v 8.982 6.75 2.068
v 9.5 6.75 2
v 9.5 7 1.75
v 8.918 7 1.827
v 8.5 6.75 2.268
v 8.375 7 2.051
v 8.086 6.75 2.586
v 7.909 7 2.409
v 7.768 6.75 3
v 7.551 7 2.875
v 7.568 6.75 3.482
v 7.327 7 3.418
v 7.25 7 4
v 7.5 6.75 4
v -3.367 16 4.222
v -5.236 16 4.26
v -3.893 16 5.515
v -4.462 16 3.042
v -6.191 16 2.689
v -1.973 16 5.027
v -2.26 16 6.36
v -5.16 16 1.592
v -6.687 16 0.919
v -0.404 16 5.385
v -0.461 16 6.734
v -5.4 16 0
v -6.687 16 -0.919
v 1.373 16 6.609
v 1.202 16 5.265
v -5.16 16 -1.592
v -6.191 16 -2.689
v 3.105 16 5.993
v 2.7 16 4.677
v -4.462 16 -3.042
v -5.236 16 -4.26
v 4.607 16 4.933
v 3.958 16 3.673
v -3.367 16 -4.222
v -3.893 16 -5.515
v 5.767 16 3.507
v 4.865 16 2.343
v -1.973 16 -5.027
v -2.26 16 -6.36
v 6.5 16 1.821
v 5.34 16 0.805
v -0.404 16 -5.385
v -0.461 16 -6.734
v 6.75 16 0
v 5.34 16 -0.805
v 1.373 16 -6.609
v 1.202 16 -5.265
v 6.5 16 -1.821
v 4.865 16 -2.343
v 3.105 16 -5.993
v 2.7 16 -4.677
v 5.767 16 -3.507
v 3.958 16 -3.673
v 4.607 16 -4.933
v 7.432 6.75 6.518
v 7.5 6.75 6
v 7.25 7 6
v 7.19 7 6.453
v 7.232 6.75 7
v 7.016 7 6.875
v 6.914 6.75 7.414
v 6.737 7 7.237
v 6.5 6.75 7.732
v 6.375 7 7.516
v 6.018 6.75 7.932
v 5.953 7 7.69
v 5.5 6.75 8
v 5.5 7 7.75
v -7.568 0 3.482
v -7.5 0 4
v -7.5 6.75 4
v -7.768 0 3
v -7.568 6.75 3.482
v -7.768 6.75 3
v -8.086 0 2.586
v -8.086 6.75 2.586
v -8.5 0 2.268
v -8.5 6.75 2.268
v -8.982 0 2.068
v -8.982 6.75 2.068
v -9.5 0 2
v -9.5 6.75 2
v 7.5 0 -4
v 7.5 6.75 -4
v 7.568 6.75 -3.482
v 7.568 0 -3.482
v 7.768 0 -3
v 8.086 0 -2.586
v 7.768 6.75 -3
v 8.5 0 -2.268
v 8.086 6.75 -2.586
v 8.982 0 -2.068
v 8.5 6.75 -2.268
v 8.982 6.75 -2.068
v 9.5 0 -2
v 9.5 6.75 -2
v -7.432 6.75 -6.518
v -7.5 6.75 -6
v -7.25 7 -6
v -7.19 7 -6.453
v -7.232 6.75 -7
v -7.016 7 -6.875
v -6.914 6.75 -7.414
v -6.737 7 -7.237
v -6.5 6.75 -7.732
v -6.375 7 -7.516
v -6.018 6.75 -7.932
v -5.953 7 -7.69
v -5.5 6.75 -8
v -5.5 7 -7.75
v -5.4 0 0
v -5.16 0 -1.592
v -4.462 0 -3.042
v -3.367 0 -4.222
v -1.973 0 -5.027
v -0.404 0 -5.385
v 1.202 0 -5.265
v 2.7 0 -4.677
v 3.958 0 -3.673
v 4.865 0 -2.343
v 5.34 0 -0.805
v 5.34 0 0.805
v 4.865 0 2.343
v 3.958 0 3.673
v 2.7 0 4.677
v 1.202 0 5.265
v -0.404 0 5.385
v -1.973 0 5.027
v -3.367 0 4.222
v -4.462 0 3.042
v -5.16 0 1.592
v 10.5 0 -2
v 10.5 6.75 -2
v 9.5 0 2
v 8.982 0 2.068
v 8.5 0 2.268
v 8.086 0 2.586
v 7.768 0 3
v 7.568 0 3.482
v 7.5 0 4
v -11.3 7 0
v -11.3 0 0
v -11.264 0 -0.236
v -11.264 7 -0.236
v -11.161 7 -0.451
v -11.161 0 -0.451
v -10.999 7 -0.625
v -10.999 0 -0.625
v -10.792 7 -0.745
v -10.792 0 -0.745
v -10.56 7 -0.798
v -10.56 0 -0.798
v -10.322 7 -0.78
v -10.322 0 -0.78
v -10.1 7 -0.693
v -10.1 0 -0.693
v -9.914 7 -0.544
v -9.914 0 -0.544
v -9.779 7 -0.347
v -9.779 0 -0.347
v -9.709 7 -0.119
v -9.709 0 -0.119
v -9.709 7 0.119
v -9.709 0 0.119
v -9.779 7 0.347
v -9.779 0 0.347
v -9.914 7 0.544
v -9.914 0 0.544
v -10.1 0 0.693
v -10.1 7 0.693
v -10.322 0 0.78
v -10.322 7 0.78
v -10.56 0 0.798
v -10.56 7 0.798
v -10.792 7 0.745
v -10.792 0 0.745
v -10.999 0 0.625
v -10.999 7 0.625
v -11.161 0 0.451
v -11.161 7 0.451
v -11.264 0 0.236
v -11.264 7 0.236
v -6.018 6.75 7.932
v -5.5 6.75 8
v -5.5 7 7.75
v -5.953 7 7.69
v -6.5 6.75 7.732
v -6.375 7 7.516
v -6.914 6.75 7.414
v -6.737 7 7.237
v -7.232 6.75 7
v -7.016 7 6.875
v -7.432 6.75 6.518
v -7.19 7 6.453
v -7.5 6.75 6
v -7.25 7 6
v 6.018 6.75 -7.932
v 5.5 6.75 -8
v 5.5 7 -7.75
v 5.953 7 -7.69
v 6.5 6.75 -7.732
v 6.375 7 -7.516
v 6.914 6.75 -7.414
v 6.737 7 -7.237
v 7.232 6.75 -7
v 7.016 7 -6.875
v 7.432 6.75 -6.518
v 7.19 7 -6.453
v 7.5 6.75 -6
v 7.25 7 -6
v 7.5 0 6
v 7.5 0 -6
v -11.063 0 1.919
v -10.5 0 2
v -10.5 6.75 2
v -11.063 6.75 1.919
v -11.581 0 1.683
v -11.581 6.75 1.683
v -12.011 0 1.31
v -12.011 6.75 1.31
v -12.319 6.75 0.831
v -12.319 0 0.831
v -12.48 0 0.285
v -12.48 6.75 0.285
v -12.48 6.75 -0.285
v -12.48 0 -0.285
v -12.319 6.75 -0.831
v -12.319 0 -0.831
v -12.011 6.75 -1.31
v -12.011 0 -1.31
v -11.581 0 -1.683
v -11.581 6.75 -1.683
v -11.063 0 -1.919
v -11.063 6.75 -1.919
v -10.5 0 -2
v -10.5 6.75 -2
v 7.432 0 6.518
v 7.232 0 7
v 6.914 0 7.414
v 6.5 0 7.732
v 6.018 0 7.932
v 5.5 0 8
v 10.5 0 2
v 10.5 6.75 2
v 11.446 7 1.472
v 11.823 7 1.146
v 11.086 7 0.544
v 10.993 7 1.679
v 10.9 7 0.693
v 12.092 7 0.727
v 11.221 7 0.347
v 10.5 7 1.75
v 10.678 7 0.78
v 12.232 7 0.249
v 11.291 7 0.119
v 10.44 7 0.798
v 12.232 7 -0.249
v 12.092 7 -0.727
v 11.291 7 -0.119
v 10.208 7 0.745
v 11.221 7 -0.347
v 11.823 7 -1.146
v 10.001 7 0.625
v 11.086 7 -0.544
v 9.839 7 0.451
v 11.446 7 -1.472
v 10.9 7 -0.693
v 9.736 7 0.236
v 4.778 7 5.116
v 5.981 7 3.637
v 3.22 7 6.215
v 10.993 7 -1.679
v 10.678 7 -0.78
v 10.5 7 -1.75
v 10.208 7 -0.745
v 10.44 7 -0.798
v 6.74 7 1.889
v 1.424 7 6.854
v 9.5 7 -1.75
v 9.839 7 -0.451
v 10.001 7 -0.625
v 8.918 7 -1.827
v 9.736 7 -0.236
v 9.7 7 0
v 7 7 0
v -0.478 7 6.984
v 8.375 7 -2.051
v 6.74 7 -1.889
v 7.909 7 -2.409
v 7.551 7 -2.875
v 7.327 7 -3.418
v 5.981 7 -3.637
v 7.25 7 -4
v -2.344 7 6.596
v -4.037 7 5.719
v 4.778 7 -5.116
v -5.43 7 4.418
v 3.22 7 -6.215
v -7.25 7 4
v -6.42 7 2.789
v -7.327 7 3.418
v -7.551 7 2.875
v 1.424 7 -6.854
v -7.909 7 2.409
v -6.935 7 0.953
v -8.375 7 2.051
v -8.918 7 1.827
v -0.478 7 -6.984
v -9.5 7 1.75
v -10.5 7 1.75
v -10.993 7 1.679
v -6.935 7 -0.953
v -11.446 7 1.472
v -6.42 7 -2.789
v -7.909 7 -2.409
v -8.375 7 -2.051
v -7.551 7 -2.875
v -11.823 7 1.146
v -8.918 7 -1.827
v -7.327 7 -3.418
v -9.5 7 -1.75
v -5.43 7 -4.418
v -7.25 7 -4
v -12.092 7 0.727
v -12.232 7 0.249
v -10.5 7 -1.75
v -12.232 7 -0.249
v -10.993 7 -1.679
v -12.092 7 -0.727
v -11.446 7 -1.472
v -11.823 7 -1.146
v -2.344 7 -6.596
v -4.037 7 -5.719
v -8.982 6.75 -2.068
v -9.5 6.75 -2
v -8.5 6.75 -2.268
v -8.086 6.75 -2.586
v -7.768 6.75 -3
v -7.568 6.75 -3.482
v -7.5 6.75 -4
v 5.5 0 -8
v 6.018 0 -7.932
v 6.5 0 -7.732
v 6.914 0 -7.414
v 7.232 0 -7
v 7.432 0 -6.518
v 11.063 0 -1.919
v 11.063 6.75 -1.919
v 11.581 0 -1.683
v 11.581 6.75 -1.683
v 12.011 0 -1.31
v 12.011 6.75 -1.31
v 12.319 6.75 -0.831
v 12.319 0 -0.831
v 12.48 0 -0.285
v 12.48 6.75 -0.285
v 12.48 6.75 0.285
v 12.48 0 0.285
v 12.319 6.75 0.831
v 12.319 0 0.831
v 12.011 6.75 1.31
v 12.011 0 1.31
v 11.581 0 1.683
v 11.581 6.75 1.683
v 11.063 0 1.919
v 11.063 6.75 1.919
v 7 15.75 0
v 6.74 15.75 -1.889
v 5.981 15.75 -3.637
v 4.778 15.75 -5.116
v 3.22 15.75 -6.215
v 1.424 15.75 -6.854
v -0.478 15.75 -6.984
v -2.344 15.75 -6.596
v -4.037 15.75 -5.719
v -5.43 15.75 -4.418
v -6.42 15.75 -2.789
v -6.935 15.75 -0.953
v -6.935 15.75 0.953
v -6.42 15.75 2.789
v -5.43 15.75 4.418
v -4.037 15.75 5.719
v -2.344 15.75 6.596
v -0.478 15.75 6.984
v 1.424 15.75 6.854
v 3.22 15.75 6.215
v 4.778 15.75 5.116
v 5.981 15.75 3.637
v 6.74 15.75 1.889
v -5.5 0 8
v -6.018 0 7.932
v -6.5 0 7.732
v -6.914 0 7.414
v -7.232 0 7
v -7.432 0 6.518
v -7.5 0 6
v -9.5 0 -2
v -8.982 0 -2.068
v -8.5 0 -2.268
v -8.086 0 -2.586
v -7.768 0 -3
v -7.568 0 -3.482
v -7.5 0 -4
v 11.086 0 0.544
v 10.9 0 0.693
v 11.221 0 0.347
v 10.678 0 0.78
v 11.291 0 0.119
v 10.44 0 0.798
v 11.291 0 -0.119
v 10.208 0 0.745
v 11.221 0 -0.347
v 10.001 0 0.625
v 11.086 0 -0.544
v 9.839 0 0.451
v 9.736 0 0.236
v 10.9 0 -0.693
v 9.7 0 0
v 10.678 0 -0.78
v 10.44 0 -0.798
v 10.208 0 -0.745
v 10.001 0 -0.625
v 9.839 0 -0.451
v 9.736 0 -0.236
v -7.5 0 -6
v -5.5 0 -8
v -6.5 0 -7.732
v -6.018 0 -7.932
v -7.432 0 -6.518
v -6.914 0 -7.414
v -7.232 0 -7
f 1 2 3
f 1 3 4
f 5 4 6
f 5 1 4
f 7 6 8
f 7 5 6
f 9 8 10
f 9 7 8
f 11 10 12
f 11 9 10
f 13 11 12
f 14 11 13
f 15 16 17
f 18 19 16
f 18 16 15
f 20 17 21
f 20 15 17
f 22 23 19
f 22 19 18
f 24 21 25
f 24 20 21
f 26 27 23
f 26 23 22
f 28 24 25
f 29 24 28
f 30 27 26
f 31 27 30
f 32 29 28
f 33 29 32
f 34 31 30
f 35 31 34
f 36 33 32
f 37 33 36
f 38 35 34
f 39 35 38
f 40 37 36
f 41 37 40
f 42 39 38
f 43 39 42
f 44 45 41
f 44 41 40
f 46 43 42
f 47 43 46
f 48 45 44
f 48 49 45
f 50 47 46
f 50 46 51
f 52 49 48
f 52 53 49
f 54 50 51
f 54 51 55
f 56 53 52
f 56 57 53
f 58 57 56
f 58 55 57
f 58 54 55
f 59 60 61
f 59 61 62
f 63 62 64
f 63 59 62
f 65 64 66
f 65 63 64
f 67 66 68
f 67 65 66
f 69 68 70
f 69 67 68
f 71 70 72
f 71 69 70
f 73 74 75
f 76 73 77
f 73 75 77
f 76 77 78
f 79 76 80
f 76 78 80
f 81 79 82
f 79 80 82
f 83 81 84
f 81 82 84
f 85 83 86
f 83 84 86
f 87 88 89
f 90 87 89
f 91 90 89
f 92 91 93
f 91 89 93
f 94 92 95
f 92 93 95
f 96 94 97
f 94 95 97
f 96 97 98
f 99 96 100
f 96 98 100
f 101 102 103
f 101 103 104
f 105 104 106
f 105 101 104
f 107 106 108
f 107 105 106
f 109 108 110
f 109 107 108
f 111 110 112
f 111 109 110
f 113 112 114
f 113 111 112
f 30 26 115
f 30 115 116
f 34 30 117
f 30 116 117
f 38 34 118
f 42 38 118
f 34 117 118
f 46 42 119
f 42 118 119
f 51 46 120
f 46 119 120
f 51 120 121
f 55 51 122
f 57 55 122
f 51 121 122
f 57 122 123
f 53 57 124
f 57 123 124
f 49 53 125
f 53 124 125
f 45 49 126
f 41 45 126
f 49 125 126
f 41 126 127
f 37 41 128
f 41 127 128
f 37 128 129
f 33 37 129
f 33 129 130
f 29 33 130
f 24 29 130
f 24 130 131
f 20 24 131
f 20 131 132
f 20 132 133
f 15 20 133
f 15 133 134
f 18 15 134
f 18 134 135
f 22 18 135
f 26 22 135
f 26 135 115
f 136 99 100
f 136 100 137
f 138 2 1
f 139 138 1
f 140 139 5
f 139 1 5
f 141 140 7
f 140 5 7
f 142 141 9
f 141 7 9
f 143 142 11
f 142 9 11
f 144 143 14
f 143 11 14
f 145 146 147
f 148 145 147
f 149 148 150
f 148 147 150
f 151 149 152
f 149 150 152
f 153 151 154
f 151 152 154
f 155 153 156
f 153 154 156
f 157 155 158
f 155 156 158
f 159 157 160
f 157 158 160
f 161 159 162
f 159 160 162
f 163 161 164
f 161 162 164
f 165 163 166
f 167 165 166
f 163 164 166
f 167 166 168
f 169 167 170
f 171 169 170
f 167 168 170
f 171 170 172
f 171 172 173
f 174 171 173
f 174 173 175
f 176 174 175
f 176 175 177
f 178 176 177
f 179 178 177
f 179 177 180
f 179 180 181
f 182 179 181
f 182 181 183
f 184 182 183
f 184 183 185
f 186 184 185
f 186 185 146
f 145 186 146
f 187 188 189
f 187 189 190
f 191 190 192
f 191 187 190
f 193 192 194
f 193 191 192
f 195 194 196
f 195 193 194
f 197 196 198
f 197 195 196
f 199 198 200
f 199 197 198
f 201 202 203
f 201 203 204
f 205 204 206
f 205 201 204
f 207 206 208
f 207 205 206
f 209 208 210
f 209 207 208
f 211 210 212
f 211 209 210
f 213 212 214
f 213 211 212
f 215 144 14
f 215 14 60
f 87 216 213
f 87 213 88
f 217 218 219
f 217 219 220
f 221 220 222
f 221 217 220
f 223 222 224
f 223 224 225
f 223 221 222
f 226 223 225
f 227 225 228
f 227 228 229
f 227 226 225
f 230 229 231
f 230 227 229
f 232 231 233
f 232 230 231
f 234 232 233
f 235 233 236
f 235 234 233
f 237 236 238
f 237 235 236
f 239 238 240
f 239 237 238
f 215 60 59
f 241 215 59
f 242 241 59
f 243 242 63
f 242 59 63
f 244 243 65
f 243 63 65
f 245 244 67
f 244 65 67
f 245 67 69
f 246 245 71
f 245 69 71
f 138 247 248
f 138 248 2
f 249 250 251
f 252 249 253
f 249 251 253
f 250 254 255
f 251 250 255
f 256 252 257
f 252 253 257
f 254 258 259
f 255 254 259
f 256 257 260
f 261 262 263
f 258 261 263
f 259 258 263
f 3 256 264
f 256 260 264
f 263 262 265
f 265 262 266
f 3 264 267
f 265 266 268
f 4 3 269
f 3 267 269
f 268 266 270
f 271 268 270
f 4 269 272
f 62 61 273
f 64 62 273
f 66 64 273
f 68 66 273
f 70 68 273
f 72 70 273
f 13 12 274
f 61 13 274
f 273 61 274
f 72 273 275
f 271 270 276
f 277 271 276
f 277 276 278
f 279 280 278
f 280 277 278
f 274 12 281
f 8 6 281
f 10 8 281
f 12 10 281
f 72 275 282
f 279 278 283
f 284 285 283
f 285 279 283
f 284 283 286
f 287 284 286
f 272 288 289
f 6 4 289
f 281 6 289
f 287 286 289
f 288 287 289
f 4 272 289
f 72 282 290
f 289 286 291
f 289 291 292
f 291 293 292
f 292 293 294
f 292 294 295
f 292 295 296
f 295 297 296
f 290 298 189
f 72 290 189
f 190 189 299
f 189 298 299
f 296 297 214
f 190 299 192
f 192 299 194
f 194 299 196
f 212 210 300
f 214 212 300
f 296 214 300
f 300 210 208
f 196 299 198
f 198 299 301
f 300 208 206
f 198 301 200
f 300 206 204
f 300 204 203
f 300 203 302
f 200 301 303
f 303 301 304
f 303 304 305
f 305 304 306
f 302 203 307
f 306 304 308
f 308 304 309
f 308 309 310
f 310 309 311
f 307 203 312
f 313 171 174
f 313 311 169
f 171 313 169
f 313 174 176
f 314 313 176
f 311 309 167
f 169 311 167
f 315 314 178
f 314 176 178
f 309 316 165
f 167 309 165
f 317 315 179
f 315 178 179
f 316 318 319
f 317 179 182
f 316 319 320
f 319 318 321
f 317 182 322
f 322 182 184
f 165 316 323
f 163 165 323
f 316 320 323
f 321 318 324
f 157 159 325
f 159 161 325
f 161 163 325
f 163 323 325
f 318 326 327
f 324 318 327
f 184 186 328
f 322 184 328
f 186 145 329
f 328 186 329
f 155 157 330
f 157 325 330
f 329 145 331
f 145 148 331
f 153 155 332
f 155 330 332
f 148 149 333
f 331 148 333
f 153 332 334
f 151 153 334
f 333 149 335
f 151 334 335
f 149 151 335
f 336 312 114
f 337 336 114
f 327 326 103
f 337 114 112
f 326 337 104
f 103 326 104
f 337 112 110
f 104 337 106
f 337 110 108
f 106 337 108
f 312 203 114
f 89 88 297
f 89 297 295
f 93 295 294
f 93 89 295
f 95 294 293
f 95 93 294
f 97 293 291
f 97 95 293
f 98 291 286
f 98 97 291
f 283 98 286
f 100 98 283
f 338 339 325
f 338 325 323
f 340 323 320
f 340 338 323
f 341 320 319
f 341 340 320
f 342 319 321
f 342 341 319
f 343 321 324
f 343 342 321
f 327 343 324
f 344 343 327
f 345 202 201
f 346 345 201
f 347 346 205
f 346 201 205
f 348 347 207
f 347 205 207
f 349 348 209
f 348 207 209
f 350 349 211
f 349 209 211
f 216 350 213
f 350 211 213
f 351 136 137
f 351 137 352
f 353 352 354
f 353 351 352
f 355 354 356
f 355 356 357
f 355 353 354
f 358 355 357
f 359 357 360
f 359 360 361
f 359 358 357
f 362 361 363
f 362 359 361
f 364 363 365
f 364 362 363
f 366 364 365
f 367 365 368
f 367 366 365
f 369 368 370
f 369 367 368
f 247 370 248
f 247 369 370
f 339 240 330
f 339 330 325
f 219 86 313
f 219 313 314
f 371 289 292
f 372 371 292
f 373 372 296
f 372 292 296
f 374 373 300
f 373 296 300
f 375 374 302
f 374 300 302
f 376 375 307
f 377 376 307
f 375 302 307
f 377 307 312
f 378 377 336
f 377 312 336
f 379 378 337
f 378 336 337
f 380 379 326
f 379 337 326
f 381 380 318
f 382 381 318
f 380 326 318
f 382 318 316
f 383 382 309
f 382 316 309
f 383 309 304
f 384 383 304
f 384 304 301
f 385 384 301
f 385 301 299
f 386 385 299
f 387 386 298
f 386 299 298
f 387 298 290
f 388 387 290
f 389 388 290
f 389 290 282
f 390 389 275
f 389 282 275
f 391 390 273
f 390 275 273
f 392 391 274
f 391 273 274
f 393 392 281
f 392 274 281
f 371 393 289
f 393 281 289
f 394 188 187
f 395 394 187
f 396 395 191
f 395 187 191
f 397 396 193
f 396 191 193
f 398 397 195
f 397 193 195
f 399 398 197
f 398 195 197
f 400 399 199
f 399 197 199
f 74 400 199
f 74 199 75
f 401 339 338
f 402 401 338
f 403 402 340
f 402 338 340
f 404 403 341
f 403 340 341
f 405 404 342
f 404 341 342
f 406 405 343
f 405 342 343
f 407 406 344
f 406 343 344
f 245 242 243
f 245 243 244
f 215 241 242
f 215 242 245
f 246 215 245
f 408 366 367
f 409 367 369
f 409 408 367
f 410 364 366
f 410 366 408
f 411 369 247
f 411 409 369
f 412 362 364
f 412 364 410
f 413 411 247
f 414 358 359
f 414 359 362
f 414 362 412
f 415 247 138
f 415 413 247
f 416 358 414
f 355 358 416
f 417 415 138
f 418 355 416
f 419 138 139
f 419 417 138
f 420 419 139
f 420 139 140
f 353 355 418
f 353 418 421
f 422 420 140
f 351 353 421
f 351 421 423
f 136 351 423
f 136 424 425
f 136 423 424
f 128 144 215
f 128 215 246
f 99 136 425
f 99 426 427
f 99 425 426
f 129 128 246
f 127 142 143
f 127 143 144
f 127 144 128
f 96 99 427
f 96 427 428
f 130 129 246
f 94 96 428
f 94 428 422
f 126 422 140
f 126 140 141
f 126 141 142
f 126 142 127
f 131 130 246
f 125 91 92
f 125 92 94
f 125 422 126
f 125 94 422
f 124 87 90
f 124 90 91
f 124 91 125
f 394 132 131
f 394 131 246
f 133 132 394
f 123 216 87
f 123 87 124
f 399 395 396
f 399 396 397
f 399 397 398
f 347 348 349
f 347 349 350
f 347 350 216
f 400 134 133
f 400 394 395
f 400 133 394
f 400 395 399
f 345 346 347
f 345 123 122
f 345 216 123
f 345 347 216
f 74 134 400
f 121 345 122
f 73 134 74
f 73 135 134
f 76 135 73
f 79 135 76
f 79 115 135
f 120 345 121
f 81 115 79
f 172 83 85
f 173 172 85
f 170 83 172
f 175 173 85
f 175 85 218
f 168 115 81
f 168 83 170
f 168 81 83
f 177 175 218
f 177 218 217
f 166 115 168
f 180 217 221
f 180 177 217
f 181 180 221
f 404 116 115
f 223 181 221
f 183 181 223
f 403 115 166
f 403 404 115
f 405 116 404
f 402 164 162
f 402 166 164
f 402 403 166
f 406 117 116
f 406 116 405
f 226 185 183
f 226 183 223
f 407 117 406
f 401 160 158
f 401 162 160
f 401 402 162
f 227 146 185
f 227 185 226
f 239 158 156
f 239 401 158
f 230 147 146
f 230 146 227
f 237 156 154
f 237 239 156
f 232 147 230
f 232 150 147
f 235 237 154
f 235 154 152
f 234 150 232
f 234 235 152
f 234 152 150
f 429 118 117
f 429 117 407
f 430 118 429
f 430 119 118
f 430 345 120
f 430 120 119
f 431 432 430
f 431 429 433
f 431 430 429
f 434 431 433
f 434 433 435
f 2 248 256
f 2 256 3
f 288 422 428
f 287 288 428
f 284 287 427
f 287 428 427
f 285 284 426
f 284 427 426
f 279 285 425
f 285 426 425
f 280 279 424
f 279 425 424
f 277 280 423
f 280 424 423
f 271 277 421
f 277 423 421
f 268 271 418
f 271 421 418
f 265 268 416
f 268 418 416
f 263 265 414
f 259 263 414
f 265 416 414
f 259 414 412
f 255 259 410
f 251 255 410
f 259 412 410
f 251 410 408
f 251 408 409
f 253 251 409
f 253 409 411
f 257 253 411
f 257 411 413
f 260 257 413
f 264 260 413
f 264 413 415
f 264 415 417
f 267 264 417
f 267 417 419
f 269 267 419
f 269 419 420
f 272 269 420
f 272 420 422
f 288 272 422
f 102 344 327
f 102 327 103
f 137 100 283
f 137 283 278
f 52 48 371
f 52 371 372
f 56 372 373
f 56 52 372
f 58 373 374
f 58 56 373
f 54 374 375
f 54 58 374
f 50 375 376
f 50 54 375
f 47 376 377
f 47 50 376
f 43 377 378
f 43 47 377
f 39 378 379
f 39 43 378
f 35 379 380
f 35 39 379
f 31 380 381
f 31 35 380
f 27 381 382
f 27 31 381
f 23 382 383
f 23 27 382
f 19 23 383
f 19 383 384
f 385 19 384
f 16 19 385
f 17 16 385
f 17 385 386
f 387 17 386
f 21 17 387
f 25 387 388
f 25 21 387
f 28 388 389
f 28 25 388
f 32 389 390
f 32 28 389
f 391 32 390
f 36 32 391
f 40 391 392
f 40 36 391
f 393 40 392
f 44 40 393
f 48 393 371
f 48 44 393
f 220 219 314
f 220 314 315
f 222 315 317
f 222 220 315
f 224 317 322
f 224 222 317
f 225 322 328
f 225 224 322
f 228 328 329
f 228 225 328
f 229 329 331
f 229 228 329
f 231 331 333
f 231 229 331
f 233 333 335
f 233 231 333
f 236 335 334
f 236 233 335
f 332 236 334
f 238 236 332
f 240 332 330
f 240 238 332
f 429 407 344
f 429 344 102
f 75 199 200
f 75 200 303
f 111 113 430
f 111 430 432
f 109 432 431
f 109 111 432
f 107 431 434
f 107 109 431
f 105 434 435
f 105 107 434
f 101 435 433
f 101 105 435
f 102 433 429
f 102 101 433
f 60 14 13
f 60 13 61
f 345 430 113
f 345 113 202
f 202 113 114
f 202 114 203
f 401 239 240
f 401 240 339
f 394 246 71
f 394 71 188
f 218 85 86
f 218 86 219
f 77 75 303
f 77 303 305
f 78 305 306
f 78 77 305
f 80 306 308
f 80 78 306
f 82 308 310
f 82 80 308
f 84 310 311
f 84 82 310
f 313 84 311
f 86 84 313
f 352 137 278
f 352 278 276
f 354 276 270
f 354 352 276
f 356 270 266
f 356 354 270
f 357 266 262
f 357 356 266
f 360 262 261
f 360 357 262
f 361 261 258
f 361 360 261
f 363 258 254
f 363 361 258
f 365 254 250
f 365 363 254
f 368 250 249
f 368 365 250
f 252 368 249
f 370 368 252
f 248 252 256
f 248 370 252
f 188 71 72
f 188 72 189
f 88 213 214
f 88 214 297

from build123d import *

# Parameters (mm, degrees)
BOSS_EXTRUDE1_DEPTH     = 7
FILLET1_R               = 2
M2X0_4_TAPPED_HOLE1_D   = 1.6
CHAMFER1_SIZE           = 0.25
SKETCH4_R               = 7
BOSS_EXTRUDE2_DEPTH     = 9
CHAMFER2_SIZE           = 0.25
M12X1_25_TAPPED_HOLE1_D = 10.8


with BuildPart() as part:
    # Sketch1 → Boss-Extrude1 (new body)
    with BuildSketch(Plane(origin=(0, 0, 0), x_dir=(1, 0, 0), z_dir=(0, 1, 0))):
        with BuildLine():
            Line((-7.5, 8), (7.5, 8))
            Line((7.5, 8), (7.5, 2))
            Line((7.5, 2), (10.5, 2))
            ThreePointArc((10.5, 2), (12.5, 0), (10.5, -2))
            Line((10.5, -2), (7.5, -2))
            Line((7.5, -2), (7.5, -8))
            Line((7.5, -8), (-7.5, -8))
            Line((-7.5, -8), (-7.5, -2))
            Line((-7.5, -2), (-10.5, -2))
            ThreePointArc((-10.5, -2), (-12.5, 0), (-10.5, 2))
            Line((-10.5, 2), (-7.5, 2))
            Line((-7.5, 2), (-7.5, 8))
        make_face()
    extrude(amount=BOSS_EXTRUDE1_DEPTH)

    # Fillet1
    fillet1_edges = [part.edges().sort_by_distance(p)[0] for p in [
        (7.5, 3.5, 8),
        (-7.5, 3.5, 8),
        (-7.5, 3.5, 2),
        (-7.5, 3.5, -2),
        (-7.5, 3.5, -8),
        (7.5, 3.5, -8),
        (7.5, 3.5, -2),
        (7.5, 3.5, 2),
    ]]
    fillet(fillet1_edges, radius=FILLET1_R)

    # M2x0.4 Tapped Hole1 (through all)
    with Locations(Plane(origin=(0, 7, 0), x_dir=(1, 0, 0), z_dir=(0, 1, 0))):
        with Locations((10.5, 0), (-10.5, 0)):
            Hole(M2X0_4_TAPPED_HOLE1_D / 2)

    # Chamfer1
    chamfer1_edges = [part.edges().sort_by_distance(p)[0] for p in [
        (12.5, 7, 0),
        (10, 7, -2),
        (-12.5, 7, 0),
        (-10, 7, 2),
        (7.5, 7, -5),
        (0, 7, -8),
        (7.5, 7, 5),
        (10, 7, 2),
        (-7.5, 7, -5),
        (-10, 7, -2),
        (-7.5, 7, 5),
        (0, 7, 8),
        (6.914213562, 7, 7.414213562),
        (-6.914213562, 7, 7.414213562),
        (-6.914213562, 7, -7.414213562),
        (6.914213562, 7, -7.414213562),
        (8.085786438, 7, -2.585786438),
        (-8.085786438, 7, -2.585786438),
        (-8.085786438, 7, 2.585786438),
        (8.085786438, 7, 2.585786438),
    ]]
    chamfer(chamfer1_edges, length=CHAMFER1_SIZE)

    # Sketch4 → Boss-Extrude2 (add)
    with BuildSketch(Plane(origin=(0, 7, 0), x_dir=(1, 0, 0), z_dir=(0, 1, 0))):
        Circle(SKETCH4_R)
    extrude(amount=BOSS_EXTRUDE2_DEPTH)

    # Chamfer2
    chamfer2_edges = [part.edges().sort_by_distance(p)[0] for p in [
        (-7, 16, 0),
    ]]
    chamfer(chamfer2_edges, length=CHAMFER2_SIZE)

    # M12x1.25 Tapped Hole1 (through all)
    with Locations(Plane(origin=(0, 16, 0), x_dir=(1, 0, 0), z_dir=(0, 1, 0))):
        with Locations((0, 0)):
            Hole(M12X1_25_TAPPED_HOLE1_D / 2)


solid = part.part
